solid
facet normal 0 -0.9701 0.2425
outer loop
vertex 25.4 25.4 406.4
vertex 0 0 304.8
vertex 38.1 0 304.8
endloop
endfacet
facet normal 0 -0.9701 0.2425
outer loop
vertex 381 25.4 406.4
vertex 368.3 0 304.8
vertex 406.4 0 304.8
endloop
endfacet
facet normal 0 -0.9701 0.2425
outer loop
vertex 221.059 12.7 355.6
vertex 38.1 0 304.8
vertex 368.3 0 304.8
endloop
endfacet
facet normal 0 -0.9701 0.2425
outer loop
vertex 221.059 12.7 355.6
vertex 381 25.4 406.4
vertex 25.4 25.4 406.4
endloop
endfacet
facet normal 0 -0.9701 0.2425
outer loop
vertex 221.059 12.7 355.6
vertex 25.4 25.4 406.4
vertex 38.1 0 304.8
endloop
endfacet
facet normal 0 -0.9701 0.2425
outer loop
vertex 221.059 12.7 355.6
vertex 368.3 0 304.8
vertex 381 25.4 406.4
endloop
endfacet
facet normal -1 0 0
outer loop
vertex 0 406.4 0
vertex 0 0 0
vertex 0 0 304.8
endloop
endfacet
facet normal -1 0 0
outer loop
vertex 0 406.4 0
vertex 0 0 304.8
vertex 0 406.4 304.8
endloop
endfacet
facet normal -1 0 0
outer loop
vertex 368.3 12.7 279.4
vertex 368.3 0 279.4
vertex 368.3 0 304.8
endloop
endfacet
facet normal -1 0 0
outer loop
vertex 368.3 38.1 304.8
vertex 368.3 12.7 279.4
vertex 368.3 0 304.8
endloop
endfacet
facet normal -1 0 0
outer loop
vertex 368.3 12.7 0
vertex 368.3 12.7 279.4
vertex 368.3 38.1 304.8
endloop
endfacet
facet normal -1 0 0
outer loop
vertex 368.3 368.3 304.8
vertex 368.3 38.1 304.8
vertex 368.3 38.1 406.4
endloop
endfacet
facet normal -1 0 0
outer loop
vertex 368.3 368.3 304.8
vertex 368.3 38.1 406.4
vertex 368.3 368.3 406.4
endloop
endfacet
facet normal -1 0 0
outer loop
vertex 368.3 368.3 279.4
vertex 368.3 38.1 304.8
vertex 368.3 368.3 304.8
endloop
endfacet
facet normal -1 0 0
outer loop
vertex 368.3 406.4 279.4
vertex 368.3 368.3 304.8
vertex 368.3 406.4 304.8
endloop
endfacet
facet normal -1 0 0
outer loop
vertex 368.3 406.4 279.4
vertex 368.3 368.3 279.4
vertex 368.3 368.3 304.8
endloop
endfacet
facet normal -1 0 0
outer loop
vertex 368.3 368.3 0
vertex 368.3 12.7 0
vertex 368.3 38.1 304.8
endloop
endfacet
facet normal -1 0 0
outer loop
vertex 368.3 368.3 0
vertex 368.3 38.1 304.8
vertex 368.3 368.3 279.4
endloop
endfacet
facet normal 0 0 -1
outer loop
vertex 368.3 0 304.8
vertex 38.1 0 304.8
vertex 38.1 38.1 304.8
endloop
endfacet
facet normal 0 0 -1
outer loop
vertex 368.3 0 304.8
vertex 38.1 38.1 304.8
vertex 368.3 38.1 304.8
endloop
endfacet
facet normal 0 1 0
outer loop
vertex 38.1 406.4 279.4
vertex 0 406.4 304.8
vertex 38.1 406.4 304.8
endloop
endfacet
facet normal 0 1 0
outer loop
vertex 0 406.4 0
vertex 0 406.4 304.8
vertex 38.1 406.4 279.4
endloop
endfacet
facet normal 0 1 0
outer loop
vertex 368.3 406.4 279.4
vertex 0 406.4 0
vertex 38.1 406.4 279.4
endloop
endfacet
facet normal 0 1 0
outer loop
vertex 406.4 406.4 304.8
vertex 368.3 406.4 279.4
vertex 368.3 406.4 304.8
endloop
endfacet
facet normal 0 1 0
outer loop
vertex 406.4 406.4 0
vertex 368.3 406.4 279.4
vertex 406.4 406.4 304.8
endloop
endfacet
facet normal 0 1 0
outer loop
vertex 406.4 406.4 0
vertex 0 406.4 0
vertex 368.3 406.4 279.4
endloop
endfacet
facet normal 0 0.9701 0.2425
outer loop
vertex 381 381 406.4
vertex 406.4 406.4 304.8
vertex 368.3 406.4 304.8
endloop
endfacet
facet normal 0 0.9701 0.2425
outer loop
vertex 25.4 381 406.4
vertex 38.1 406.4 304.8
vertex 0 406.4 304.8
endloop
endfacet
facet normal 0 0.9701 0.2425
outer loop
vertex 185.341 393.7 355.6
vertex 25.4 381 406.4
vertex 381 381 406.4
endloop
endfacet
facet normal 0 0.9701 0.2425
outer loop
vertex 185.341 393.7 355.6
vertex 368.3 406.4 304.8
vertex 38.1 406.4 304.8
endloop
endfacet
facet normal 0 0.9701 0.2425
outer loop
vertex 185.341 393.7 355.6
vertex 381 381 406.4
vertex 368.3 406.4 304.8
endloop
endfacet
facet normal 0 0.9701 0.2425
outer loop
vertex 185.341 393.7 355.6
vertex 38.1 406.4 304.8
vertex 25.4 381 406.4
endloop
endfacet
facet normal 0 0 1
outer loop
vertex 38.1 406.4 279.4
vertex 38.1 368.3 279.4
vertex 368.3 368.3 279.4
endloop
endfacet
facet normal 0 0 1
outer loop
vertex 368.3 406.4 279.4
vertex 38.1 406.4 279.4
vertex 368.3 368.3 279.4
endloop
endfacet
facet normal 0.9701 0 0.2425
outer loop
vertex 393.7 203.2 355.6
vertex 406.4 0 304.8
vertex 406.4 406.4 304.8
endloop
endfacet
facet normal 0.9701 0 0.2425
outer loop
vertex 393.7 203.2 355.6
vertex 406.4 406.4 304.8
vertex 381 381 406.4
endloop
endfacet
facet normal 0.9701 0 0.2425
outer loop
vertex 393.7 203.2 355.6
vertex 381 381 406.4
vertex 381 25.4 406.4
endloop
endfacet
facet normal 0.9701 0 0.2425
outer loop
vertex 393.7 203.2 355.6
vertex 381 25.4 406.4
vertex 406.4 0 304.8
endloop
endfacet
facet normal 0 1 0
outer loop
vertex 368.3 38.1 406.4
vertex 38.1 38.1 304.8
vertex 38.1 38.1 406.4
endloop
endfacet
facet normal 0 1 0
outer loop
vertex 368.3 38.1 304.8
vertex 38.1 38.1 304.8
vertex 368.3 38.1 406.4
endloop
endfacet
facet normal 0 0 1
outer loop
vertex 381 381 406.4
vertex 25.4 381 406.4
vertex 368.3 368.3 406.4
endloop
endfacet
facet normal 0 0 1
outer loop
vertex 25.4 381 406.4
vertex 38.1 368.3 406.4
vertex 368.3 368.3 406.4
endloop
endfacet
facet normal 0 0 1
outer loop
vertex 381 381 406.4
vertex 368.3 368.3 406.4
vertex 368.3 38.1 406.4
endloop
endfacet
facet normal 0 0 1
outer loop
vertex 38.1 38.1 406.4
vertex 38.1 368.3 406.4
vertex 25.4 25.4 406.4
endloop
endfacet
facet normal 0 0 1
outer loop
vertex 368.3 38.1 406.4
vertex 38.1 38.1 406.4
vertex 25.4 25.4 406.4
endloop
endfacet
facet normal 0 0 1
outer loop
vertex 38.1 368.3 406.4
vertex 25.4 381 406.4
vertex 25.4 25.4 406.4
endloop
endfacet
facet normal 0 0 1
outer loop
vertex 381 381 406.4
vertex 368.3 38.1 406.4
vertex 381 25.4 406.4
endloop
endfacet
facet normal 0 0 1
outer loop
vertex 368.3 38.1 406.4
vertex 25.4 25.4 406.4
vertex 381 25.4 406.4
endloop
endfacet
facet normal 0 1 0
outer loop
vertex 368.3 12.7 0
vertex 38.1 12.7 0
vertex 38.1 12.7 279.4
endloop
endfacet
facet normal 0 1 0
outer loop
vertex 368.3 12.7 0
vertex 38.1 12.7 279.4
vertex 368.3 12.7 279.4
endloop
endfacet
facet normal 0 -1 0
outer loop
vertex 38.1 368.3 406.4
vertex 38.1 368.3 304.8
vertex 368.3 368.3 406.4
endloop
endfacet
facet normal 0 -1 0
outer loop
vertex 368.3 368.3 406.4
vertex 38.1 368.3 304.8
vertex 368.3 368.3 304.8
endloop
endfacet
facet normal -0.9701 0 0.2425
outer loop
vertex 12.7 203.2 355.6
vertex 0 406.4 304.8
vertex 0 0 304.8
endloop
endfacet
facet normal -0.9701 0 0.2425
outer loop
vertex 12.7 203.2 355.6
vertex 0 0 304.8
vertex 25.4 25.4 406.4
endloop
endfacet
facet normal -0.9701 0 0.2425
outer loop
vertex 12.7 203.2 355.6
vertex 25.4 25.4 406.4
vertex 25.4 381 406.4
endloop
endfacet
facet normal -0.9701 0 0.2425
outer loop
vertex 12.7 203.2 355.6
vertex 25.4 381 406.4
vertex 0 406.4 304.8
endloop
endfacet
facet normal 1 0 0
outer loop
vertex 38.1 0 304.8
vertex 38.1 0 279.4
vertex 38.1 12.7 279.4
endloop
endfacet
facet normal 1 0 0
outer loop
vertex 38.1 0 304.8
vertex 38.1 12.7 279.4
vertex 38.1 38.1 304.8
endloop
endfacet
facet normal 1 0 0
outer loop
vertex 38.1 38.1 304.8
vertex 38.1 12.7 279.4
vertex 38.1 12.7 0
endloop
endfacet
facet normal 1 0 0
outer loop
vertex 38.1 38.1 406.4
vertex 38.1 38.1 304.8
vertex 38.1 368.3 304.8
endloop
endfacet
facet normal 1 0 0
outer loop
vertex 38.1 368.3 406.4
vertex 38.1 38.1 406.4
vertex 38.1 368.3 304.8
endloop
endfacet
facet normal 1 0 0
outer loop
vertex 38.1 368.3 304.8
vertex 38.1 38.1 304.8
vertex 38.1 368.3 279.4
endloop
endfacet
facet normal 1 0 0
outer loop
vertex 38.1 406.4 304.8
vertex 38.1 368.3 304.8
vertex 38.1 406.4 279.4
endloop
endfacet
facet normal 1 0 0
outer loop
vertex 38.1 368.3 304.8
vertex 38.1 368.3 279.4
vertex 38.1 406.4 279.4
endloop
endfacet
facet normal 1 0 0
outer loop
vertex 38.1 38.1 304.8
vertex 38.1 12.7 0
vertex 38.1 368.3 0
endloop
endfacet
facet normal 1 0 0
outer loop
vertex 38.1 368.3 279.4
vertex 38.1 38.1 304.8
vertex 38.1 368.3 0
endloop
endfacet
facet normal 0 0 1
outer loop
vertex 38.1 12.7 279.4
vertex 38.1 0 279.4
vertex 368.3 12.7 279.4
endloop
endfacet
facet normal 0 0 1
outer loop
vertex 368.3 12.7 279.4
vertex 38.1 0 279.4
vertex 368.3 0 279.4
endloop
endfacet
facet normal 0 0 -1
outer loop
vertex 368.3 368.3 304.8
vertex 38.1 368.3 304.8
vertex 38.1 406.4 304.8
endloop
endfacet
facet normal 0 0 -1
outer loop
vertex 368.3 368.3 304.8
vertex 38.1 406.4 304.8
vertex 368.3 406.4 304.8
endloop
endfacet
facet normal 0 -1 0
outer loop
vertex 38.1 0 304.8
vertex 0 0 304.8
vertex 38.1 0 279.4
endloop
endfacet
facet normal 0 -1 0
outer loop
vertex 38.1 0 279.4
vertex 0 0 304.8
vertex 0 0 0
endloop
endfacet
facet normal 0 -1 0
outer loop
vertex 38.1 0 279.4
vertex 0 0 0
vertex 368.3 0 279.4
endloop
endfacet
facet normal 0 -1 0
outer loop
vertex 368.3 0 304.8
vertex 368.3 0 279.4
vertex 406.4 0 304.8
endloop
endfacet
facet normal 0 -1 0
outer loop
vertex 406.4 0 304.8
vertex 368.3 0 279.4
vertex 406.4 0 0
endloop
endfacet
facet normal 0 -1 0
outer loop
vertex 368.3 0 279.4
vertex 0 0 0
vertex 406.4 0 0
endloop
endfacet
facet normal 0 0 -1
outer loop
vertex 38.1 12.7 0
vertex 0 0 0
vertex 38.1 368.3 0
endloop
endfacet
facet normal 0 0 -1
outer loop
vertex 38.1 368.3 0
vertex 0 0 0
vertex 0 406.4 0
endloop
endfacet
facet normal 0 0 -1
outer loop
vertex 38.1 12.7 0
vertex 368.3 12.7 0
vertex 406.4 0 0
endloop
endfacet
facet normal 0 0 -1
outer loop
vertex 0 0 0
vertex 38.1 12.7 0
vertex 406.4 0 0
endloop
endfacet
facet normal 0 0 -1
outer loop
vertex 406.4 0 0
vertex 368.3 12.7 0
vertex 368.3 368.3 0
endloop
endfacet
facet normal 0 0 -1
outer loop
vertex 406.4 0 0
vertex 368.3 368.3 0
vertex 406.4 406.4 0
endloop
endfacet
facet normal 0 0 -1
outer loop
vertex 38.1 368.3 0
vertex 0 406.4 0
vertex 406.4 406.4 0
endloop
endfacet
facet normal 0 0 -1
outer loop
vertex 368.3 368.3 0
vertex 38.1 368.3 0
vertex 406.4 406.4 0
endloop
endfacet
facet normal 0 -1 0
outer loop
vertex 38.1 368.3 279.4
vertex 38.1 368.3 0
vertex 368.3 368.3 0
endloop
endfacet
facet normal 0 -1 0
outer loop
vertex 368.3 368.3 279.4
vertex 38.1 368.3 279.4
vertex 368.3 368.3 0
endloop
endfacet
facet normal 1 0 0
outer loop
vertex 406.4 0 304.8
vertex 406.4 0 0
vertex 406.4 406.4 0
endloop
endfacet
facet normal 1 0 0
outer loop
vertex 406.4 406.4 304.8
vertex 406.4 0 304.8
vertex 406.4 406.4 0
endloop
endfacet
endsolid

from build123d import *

# Parameters (mm, degrees)
SKETCH1_W               = 406.4
SKETCH1_H               = 406.4
BOSS_EXTRUDE1_DEPTH     = 304.8
CUT_EXTRUDE2_DEPTH      = 704.905448311
CUT_EXTRUDE2_DEPTH_BACK = 704.905448311
SKETCH6_W               = 330.2
SKETCH6_H               = 330.2
CUT_EXTRUDE3_DEPTH      = 704.905448369
CUT_EXTRUDE3_DEPTH_BACK = 704.905448369
SKETCH7_W               = 330.2
SKETCH7_H               = 25.4
SKETCH8_W               = 330.2
SKETCH8_H               = 279.4
CUT_EXTRUDE4_DEPTH      = 25.4


with BuildPart() as part:
    # Sketch1 → Boss-Extrude1 (new body)
    with BuildSketch(Plane.XY):
        with Locations((203.2, 203.2)):
            Rectangle(SKETCH1_W, SKETCH1_H)
    extrude(amount=BOSS_EXTRUDE1_DEPTH)

    # Sketch2 → section 1 of loft1
    with BuildSketch(Plane.XY.offset(406.4), mode=Mode.PRIVATE) as loft1_s1:
        with BuildLine():
            Line((25.4, 25.4), (381, 25.4))
            Line((381, 25.4), (381, 381))
            Line((381, 381), (25.4, 381))
            Line((25.4, 381), (25.4, 25.4))
        make_face()
    # loft from a face of the part (loft1)
    loft([part.faces().sort_by_distance((203.2, 203.2, 304.8))[0], loft1_s1.sketch])

    # Sketch6 → Cut-Extrude2 (cut, two sides: drawn at the far end of the back side and taken through both)
    with BuildSketch(Plane.XY.offset(406.4).offset(-CUT_EXTRUDE2_DEPTH_BACK)):
        with Locations((203.2, 203.2)):
            Rectangle(SKETCH6_W, SKETCH6_H)
    extrude(amount=CUT_EXTRUDE2_DEPTH + CUT_EXTRUDE2_DEPTH_BACK, mode=Mode.SUBTRACT)

    # Sketch7 → Cut-Extrude3 (cut, two sides: drawn at the far end of the back side and taken through both)
    with BuildSketch(Plane(origin=(0, 406.4, 0), x_dir=(1, 0, 0), z_dir=(0, 1, 0)).offset(-CUT_EXTRUDE3_DEPTH_BACK)):
        with Locations((203.2, -292.1)):
            Rectangle(SKETCH7_W, SKETCH7_H)
    extrude(amount=CUT_EXTRUDE3_DEPTH + CUT_EXTRUDE3_DEPTH_BACK, mode=Mode.SUBTRACT)

    # Sketch8 → Cut-Extrude4 (cut)
    with BuildSketch(Plane(origin=(0, 38.1, 0), x_dir=(1, 0, 0), z_dir=(0, 1, 0))):
        with Locations((203.2, -139.7)):
            Rectangle(SKETCH8_W, SKETCH8_H)
    extrude(amount=-CUT_EXTRUDE4_DEPTH, mode=Mode.SUBTRACT)


solid = part.part
